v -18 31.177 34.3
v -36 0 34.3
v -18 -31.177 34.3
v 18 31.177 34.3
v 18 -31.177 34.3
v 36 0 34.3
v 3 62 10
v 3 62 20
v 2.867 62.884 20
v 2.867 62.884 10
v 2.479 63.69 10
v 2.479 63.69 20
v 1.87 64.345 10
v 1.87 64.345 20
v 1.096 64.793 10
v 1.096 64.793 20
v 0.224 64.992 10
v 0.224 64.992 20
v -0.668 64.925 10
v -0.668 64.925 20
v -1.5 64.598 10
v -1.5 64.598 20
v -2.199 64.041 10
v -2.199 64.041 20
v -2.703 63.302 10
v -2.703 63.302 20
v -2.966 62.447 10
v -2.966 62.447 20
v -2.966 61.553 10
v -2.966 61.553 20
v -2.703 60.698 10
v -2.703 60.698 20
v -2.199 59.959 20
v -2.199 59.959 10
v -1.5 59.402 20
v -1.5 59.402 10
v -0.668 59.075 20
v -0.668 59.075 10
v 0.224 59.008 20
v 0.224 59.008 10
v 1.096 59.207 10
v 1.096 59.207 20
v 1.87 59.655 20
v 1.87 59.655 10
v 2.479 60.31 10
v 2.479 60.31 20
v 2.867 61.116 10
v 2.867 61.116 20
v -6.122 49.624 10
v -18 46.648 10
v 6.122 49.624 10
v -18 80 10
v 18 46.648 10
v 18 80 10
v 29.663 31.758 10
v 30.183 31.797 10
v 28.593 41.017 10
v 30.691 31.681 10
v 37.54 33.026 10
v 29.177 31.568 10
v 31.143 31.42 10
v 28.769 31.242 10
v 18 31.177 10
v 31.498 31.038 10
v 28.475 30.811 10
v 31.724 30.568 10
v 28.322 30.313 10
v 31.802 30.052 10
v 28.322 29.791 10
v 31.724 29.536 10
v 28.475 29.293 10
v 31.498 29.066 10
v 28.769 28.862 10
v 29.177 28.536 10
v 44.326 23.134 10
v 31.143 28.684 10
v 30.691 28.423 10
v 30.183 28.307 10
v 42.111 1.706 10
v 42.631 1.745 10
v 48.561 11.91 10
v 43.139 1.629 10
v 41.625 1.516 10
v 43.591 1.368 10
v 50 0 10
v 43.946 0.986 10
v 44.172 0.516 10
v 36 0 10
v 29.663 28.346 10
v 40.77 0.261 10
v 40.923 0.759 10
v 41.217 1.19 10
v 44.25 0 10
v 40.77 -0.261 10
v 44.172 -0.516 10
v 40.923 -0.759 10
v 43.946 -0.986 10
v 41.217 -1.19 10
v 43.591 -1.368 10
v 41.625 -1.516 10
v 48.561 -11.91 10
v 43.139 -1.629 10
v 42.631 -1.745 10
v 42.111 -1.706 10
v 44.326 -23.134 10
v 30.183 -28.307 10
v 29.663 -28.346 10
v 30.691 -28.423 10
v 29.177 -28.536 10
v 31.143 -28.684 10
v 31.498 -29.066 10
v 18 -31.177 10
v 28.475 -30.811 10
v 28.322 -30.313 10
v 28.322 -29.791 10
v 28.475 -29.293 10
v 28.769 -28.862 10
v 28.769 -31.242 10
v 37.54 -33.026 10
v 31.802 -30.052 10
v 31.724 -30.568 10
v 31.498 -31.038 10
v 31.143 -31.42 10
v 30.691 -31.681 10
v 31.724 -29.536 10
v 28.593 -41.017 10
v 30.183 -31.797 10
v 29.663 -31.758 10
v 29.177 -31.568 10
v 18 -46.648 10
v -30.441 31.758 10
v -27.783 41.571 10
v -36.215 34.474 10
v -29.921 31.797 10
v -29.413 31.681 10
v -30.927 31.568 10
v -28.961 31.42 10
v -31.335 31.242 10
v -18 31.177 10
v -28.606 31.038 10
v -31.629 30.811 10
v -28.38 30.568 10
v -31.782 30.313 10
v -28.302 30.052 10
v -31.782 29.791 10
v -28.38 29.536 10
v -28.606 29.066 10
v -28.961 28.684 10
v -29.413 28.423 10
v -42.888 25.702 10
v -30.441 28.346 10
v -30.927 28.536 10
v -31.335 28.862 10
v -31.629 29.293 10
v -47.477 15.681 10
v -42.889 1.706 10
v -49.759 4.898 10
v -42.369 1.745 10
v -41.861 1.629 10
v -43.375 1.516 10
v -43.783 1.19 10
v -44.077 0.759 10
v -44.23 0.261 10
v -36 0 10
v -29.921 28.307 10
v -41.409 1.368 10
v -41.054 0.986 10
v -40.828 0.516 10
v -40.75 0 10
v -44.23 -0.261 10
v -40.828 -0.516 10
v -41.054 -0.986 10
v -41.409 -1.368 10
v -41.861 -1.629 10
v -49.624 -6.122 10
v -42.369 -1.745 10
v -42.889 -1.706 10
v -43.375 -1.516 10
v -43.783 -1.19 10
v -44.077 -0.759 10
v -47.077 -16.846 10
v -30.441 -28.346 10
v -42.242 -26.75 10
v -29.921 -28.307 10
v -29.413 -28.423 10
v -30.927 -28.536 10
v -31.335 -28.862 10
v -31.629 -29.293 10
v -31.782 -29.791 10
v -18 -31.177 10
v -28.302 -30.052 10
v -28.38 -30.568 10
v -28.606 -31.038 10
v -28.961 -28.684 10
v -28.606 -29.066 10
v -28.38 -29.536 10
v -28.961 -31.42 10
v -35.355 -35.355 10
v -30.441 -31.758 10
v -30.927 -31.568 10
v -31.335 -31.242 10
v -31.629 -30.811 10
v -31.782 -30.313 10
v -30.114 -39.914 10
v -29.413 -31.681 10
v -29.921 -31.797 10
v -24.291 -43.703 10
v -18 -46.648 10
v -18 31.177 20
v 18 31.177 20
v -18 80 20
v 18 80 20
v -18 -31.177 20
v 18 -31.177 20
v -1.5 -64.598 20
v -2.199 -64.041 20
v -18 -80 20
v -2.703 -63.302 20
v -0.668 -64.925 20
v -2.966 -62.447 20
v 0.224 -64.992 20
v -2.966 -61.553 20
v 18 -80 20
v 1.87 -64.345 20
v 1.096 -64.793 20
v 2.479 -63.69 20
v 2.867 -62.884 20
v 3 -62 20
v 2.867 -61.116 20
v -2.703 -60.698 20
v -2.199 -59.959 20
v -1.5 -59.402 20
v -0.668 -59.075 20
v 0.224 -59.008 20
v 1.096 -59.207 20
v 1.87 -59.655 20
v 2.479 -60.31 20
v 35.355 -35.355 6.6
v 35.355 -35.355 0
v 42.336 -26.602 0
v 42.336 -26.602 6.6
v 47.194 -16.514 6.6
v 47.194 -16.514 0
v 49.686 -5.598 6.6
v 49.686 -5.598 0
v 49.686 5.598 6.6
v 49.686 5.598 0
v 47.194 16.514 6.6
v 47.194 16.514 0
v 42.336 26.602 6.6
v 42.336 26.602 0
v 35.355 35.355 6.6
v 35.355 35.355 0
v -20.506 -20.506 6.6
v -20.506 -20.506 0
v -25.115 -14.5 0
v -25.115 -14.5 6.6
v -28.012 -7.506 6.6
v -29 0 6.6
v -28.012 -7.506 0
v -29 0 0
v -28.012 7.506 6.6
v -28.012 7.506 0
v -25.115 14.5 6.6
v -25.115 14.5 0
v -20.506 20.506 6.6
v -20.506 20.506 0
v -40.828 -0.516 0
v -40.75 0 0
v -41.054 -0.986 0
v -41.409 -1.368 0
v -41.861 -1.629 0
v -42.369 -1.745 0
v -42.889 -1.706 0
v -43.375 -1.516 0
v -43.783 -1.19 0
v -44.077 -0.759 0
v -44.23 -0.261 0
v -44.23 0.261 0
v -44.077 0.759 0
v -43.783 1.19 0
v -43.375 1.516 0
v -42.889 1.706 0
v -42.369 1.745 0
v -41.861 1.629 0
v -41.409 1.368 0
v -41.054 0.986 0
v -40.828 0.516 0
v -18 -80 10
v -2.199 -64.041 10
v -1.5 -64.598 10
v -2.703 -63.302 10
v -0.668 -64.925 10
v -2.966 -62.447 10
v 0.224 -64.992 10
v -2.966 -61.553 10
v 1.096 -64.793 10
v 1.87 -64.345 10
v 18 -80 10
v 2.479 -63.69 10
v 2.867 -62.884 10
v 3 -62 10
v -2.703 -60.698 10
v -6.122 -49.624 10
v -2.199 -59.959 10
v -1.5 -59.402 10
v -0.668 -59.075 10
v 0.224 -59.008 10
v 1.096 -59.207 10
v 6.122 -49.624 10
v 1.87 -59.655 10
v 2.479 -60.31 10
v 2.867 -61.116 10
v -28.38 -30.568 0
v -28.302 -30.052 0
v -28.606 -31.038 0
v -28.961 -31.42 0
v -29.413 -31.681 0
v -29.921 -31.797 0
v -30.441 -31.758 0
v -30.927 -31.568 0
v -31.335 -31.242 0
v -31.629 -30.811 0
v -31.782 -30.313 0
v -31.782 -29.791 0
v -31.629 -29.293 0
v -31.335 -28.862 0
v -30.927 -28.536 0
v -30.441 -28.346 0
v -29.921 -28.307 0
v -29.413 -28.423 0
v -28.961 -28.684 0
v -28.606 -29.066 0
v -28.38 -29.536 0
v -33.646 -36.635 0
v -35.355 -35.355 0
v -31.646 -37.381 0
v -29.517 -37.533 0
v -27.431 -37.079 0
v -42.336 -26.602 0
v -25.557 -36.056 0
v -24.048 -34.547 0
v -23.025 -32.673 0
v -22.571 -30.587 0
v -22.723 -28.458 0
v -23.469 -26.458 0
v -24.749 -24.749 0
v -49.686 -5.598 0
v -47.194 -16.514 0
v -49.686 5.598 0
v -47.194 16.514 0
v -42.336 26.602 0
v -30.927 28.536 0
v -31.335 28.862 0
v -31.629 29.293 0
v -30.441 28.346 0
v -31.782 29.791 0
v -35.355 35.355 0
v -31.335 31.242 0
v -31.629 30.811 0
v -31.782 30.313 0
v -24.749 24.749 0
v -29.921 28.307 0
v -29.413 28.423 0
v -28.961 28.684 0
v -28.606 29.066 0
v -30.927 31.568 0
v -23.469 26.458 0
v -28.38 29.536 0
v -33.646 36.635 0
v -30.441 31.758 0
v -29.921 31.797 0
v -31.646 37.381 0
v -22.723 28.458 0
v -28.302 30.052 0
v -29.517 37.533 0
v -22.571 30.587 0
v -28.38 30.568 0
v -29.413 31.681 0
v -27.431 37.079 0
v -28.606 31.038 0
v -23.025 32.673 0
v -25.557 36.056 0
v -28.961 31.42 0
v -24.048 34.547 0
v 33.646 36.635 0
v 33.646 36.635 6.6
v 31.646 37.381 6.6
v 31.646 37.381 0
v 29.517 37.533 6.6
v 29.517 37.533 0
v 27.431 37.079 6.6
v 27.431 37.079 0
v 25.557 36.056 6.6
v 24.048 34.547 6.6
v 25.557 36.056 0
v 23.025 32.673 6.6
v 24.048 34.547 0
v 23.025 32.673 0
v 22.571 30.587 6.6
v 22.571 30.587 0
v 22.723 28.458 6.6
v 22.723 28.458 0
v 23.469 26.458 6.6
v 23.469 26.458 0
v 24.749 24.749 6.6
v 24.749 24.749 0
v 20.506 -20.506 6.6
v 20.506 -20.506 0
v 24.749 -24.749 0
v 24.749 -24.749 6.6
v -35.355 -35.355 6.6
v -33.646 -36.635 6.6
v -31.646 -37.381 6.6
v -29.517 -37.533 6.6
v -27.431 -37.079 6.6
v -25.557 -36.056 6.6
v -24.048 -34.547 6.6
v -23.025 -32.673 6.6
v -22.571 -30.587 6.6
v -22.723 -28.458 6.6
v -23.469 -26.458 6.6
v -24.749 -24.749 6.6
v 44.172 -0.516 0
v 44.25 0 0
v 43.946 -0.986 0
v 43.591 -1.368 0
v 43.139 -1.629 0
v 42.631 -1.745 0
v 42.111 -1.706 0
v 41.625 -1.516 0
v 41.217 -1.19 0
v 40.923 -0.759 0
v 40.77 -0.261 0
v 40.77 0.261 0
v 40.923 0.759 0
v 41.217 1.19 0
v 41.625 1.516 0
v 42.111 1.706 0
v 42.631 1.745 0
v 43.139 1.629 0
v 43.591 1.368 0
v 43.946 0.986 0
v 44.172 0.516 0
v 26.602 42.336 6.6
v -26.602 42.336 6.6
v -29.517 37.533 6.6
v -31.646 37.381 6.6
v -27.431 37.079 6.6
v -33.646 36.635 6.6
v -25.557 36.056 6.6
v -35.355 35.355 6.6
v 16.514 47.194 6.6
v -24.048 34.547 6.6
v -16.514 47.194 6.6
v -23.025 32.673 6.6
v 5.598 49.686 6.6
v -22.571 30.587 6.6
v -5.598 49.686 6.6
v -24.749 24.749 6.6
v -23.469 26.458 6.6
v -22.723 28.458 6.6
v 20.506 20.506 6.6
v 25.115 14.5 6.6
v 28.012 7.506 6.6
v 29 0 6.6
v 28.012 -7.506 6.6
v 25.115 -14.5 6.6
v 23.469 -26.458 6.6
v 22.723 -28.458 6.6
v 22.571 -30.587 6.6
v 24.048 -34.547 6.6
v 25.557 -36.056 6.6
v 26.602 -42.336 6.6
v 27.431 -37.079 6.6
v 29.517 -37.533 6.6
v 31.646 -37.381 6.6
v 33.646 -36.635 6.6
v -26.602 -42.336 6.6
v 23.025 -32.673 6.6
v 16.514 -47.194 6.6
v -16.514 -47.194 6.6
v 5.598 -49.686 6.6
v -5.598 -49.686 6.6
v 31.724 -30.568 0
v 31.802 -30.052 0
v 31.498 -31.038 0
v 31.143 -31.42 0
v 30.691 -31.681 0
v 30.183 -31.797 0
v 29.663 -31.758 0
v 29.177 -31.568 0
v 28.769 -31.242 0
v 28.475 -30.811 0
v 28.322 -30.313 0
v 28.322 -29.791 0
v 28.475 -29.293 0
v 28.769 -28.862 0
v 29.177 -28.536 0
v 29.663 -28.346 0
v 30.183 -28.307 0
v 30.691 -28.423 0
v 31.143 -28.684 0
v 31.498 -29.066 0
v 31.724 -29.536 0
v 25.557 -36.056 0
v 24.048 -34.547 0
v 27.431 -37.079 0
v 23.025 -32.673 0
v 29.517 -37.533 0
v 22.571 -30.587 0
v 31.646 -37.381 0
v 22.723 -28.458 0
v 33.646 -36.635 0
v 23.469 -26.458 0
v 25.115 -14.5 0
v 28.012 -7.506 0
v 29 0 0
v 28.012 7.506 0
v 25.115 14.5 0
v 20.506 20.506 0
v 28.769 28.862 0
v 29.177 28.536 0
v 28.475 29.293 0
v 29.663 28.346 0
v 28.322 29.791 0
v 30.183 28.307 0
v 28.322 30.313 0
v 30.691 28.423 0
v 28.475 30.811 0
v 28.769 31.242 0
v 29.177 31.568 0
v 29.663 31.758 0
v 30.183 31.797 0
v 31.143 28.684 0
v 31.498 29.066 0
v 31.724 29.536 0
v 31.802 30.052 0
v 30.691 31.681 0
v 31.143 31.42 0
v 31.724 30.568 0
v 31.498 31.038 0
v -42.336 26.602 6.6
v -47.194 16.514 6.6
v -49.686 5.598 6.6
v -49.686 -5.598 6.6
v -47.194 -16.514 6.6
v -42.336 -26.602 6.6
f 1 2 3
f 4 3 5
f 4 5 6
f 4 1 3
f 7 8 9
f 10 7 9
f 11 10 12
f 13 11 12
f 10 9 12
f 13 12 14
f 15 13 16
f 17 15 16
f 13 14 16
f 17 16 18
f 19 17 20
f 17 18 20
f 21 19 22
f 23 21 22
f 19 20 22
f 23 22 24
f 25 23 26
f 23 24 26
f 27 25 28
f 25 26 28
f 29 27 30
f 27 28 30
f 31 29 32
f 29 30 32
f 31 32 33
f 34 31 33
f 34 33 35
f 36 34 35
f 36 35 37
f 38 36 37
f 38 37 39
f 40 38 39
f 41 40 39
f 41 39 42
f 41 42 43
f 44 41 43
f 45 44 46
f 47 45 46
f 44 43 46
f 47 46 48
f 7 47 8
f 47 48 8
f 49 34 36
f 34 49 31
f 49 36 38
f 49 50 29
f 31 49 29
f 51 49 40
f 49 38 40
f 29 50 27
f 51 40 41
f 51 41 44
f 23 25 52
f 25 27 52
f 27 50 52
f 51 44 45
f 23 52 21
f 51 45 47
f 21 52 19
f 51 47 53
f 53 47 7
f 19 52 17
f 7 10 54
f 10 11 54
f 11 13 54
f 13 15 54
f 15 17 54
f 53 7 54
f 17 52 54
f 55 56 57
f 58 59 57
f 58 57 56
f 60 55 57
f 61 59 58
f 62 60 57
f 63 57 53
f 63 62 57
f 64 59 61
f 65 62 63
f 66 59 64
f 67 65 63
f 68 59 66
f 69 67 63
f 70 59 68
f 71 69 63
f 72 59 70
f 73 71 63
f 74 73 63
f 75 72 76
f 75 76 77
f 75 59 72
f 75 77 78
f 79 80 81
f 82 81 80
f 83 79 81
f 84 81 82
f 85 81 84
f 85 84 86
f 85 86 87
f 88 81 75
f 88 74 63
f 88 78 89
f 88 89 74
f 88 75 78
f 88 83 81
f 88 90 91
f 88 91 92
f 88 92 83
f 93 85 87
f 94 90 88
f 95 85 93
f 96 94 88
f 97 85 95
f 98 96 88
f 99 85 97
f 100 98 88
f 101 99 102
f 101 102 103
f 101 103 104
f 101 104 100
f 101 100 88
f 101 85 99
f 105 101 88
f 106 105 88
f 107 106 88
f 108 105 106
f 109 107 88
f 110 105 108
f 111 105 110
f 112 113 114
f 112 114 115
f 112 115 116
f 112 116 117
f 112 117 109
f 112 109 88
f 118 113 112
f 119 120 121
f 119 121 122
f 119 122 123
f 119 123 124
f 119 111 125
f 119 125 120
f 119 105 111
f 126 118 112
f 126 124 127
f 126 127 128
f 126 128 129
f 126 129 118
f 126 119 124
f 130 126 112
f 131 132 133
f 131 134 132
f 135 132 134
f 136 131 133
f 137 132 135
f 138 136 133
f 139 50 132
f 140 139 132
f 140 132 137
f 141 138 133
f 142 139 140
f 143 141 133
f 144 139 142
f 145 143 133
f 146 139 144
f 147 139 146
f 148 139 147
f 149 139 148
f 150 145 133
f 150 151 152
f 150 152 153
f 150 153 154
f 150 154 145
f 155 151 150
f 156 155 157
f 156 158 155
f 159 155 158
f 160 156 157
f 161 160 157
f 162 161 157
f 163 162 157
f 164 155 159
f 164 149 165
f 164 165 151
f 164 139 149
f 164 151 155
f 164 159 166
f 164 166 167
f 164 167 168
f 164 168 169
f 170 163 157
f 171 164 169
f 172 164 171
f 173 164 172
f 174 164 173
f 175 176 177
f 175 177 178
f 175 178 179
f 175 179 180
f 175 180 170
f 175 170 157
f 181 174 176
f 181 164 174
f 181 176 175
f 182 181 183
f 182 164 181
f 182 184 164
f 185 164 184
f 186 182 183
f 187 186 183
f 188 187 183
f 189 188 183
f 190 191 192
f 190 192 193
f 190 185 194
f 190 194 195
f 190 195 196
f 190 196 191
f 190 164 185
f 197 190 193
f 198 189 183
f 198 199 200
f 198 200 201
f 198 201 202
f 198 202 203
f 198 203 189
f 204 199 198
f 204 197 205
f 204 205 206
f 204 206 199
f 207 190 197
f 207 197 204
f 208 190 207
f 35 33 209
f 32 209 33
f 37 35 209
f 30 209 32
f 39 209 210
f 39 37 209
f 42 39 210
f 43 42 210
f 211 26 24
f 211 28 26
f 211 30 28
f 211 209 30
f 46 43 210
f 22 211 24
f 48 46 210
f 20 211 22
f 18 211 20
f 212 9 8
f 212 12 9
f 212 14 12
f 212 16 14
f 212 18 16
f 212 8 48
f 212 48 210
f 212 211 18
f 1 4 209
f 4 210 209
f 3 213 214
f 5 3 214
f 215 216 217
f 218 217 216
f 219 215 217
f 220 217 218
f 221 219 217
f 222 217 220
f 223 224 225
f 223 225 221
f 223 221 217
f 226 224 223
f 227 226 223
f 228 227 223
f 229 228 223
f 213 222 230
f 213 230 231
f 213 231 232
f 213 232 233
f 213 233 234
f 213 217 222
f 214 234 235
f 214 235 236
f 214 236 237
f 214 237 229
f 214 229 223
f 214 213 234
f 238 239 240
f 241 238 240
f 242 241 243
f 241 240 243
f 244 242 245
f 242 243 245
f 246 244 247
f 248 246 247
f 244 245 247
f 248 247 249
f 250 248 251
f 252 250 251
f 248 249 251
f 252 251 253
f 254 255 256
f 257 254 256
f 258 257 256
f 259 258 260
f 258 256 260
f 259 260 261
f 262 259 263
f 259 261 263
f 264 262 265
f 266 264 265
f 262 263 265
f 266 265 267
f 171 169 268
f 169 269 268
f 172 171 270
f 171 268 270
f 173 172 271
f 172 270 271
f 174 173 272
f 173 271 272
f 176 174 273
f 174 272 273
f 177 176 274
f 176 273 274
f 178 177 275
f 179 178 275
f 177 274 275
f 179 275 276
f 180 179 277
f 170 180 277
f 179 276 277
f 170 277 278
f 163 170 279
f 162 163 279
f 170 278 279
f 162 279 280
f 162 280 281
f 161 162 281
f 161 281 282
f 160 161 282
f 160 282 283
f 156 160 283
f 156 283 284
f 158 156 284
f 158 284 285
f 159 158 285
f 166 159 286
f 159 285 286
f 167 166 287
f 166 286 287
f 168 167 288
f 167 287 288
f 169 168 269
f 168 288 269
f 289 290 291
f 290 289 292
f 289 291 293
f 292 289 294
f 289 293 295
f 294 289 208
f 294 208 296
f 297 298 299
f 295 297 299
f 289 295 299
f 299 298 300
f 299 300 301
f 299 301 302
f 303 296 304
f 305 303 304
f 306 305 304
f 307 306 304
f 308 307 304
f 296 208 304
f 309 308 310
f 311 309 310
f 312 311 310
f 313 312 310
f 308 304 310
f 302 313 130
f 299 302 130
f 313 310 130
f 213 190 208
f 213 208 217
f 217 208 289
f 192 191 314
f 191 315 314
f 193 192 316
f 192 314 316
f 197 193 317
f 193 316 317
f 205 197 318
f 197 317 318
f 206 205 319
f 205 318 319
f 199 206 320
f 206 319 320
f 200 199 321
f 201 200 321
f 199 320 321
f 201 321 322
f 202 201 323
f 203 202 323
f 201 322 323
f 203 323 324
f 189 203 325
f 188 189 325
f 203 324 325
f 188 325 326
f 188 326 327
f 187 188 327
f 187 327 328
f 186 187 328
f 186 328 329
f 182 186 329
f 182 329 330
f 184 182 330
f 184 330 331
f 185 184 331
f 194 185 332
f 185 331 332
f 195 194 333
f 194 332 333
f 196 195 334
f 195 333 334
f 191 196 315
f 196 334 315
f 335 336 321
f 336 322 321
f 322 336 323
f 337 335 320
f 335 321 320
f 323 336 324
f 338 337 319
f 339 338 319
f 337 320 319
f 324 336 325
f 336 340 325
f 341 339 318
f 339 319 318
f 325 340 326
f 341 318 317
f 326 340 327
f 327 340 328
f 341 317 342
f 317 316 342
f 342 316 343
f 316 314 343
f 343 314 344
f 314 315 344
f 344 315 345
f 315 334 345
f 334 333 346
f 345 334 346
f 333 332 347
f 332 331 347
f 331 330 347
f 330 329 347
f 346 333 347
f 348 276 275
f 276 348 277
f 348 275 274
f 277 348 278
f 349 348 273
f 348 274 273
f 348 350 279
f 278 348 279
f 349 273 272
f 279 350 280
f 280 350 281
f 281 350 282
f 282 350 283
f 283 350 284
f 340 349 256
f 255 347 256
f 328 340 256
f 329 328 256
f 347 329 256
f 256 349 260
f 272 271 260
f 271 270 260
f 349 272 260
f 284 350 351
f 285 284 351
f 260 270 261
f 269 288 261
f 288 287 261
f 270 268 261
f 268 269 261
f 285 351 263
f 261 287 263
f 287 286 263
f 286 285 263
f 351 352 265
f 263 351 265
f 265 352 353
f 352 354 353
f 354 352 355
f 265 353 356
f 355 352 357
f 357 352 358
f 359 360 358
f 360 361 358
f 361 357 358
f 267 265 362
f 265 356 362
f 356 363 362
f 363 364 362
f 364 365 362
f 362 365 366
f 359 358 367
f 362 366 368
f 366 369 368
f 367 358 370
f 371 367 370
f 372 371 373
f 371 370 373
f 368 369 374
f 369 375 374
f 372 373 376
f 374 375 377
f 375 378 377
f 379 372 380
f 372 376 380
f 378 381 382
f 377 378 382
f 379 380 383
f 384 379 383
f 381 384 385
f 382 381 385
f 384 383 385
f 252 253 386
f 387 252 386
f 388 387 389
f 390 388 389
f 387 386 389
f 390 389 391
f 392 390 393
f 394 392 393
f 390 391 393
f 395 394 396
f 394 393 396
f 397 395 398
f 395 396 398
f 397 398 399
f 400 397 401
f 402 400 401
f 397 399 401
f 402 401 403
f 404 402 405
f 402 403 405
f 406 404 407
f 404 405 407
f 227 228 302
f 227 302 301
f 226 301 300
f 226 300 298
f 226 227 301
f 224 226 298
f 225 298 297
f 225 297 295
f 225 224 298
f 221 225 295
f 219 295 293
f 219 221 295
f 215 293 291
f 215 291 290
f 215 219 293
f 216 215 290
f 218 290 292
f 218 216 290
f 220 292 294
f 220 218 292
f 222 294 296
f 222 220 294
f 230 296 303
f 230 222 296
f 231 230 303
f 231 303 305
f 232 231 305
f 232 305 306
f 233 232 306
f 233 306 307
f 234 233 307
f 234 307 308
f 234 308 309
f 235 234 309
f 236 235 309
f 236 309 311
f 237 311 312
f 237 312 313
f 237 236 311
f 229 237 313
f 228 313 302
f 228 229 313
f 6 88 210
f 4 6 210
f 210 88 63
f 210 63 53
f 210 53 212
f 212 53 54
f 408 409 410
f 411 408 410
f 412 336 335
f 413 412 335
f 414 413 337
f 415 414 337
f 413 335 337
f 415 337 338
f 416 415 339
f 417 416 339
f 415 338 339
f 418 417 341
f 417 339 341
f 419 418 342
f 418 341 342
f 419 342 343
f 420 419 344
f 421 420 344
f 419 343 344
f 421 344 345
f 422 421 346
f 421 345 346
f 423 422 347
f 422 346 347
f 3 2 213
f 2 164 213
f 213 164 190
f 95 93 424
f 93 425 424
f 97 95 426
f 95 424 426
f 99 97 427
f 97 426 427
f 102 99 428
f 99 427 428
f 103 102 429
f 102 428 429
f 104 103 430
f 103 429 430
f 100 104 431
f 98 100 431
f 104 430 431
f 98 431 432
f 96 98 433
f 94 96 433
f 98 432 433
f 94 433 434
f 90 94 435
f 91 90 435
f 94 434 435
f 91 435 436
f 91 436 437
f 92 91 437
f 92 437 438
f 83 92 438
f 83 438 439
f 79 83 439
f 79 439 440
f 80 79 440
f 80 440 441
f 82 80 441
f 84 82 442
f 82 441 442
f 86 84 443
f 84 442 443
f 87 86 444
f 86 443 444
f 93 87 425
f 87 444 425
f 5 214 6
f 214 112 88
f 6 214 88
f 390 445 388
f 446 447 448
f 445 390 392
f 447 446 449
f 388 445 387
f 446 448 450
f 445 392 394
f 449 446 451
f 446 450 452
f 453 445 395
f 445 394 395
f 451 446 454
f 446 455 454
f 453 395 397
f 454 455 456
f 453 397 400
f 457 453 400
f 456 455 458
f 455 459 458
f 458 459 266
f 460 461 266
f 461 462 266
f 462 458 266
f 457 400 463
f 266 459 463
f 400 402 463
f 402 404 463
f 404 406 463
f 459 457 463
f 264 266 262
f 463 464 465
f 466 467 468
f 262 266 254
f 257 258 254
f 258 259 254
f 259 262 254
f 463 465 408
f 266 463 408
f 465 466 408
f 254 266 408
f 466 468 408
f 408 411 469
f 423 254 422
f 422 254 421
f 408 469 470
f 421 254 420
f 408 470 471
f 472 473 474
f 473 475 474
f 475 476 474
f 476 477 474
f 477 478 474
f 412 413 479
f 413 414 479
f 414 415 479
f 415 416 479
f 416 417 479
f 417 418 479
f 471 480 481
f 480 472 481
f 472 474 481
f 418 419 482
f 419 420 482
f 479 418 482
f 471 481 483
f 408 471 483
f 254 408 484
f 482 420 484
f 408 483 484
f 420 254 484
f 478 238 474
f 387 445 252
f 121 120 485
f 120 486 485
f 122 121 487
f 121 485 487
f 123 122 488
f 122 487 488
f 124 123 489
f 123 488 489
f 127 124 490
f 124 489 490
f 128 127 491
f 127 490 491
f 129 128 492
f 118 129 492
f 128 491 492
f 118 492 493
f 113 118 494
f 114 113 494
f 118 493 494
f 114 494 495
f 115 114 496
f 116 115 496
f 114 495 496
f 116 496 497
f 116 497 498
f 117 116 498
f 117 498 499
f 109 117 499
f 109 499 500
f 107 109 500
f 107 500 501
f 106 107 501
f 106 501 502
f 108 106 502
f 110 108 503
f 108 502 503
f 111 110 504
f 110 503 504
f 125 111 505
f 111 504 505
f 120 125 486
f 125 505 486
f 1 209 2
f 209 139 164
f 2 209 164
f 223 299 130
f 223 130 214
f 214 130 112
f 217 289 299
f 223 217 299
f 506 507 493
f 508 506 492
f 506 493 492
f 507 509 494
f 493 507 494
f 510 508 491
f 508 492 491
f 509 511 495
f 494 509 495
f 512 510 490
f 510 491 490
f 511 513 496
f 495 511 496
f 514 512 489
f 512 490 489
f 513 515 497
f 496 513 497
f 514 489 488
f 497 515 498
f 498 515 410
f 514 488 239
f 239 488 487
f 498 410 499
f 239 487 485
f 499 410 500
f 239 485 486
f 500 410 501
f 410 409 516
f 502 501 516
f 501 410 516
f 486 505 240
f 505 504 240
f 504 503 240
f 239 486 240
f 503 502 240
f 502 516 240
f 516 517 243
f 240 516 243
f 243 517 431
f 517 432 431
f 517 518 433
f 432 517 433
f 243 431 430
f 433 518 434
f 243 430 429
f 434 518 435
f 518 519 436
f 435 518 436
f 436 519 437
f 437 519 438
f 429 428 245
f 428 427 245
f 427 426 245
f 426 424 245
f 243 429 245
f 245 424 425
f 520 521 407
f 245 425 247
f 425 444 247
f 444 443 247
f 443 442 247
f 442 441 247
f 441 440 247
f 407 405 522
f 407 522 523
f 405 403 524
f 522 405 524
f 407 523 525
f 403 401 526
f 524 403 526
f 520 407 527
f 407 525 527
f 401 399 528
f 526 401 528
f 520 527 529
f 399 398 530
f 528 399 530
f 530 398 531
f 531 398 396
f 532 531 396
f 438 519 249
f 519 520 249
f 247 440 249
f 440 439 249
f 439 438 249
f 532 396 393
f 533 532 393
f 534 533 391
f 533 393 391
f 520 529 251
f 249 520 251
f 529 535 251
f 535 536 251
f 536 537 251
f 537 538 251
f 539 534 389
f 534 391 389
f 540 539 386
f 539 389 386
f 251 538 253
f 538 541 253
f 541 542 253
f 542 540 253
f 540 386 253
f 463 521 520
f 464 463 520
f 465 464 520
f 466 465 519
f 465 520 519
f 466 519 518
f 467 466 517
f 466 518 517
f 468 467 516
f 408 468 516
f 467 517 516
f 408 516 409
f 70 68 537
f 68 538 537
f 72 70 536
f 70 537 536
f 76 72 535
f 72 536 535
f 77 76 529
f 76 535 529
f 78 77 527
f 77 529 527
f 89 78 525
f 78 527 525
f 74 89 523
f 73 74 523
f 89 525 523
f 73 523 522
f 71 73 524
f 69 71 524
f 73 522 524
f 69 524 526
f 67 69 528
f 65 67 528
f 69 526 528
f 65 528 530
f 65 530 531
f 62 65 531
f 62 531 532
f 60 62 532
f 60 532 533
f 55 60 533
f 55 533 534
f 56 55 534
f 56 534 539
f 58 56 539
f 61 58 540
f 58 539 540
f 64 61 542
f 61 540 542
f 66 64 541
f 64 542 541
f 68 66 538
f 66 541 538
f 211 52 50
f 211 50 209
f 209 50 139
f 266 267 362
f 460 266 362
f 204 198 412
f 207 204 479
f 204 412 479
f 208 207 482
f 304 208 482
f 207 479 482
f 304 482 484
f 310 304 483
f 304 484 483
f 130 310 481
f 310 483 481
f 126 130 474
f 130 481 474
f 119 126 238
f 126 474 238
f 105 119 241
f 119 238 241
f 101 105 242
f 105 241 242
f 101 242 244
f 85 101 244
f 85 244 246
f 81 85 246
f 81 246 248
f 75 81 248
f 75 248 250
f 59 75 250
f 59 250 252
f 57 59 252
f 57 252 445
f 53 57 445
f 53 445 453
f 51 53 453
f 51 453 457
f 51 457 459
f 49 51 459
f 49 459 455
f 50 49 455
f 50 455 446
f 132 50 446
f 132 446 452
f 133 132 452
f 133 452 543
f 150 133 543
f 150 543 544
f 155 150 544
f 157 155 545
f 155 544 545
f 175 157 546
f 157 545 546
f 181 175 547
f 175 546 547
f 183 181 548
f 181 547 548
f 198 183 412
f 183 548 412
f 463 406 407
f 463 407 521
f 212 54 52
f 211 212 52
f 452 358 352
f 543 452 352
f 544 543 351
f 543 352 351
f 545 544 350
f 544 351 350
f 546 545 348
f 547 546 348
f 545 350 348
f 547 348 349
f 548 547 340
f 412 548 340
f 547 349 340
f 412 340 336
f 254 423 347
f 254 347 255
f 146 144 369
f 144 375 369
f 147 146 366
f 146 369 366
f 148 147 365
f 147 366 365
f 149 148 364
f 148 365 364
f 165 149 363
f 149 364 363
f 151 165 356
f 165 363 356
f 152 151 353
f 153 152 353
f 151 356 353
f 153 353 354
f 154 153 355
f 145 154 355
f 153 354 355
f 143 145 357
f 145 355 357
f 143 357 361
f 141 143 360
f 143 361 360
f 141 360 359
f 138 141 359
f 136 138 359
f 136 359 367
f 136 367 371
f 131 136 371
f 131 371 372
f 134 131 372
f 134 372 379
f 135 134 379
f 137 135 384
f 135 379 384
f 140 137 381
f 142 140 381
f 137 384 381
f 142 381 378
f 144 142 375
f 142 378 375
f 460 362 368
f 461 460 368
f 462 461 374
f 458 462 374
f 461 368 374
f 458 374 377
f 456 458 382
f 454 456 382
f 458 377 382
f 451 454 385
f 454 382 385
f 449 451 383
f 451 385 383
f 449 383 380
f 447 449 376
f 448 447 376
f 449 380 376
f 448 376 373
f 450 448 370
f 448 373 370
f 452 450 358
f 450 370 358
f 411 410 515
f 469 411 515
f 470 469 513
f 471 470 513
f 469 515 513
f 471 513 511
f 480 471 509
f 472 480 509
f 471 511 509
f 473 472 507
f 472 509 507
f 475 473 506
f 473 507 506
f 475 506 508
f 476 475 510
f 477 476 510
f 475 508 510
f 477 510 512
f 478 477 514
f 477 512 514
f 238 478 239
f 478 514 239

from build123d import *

# Parameters (mm, degrees)
SKETCH_1_R          = 1.75
EXTRUDE_1_DEPTH     = 6.6
EXTRUDE_1_2_DEPTH   = 6.6
SKETCH_2_R          = 50
EXTRUDE_2_DEPTH     = 3.4
SKETCH_4_R          = 1.75
CUT_EXTRUDE_2_DEPTH = 10
EXTRUDE_7_DEPTH     = 20
SKETCH_10_W         = 36
SKETCH_10_H         = 48.823085464
CUT_EXTRUDE_3_DEPTH = 10
SKETCH_11_R         = 3
CUT_EXTRUDE_6_DEPTH = 10
EXTRUDE_8_DEPTH     = 4.3


with BuildPart() as part:
    # 草图1 → 凸台-拉伸1 (new body)
    with BuildSketch(Plane.XY):
        with BuildLine():
            ThreePointArc((20.506096654, 20.506096654), (29, 0), (20.506096654, -20.506096654))
            Line((20.506096654, -20.506096654), (24.748737342, -24.748737342))
            ThreePointArc((24.748737342, -24.748737342), (24.748737342, -35.355339059), (35.355339059, -35.355339059))
            ThreePointArc((35.355339059, -35.355339059), (50, 0), (35.355339059, 35.355339059))
            ThreePointArc((35.355339059, 35.355339059), (24.748737342, 35.355339059), (24.748737342, 24.748737342))
            Line((24.748737342, 24.748737342), (20.506096654, 20.506096654))
        make_face()
        with Locations((30.0520382, 30.0520382)):
            Circle(SKETCH_1_R, mode=Mode.SUBTRACT)
        with Locations((30.0520382, -30.0520382)):
            Circle(SKETCH_1_R, mode=Mode.SUBTRACT)
        with Locations((42.5, 0)):
            Circle(SKETCH_1_R, mode=Mode.SUBTRACT)
    extrude(amount=EXTRUDE_1_DEPTH)



with BuildPart() as body_2:
    # 草图1 → Extrude 1 2 (new body)
    with BuildSketch(Plane.XY):
        with BuildLine():
            ThreePointArc((-35.355339059, 35.355339059), (-50, 0), (-35.355339059, -35.355339059))
            ThreePointArc((-35.355339059, -35.355339059), (-24.748737342, -35.355339059), (-24.748737342, -24.748737342))
            Line((-24.748737342, -24.748737342), (-20.506096654, -20.506096654))
            ThreePointArc((-20.506096654, -20.506096654), (-29, 0), (-20.506096654, 20.506096654))
            Line((-20.506096654, 20.506096654), (-24.748737342, 24.748737342))
            ThreePointArc((-24.748737342, 24.748737342), (-24.748737342, 35.355339059), (-35.355339059, 35.355339059))
        make_face()
        with Locations((-30.0520382, 30.0520382)):
            Circle(SKETCH_1_R, mode=Mode.SUBTRACT)
        with Locations((-30.0520382, -30.0520382)):
            Circle(SKETCH_1_R, mode=Mode.SUBTRACT)
        with Locations((-42.5, 0)):
            Circle(SKETCH_1_R, mode=Mode.SUBTRACT)
    extrude(amount=EXTRUDE_1_2_DEPTH)


with BuildPart() as part_1:
    add(part.part)

    add(body_2.part)  # 凸台-拉伸2 merges body 2
    # 草图2 → 凸台-拉伸2 (add)
    with BuildSketch(Plane.XY.offset(6.6)):
        with Locations(Location((0, 0, 0), (0, 0, 225))):
            Circle(SKETCH_2_R)
    extrude(amount=EXTRUDE_2_DEPTH)

    # 草图4 → 切除-拉伸2 (cut, symmetric)
    with BuildSketch(Plane(origin=(0, 0, 6.6), x_dir=(-1, 0, 0), z_dir=(0, 0, -1))):
        with Locations(Location((-42.5, 0, 0), (0, 0, 180))):
            Circle(SKETCH_4_R)
        with Locations(Location((-30.0520382, 30.0520382, 0), (0, 0, 180))):
            Circle(SKETCH_4_R)
        with Locations(Location((-30.0520382, -30.0520382, 0), (0, 0, 180))):
            Circle(SKETCH_4_R)
        with Locations(Location((30.0520382, -30.0520382, 0), (0, 0, 180))):
            Circle(SKETCH_4_R)
        with Locations(Location((42.5, 0, 0), (0, 0, 180))):
            Circle(SKETCH_4_R)
        with Locations(Location((30.0520382, 30.0520382, 0), (0, 0, 180))):
            Circle(SKETCH_4_R)
    extrude(amount=CUT_EXTRUDE_2_DEPTH, both=True, mode=Mode.SUBTRACT)

    # 草图5 → 凸台-拉伸7 (add)
    with BuildSketch(Plane.XY.offset(10)):
        Polygon((-18, -31.176914536), (-18, -80), (18, -80), (18, -31.176914536), (36, 0), (18, 31.176914536), (18, 80), (-18, 80), (-18, 31.176914536), (-36, 0), align=None)
    extrude(amount=EXTRUDE_7_DEPTH)

    # 草图10 → 切除-拉伸3 (cut)
    with BuildSketch(Plane.XY.offset(30)):
        with Locations((0, -55.588457268)):
            Rectangle(SKETCH_10_W, SKETCH_10_H)
        with Locations((0, 55.588457268)):
            Rectangle(SKETCH_10_W, SKETCH_10_H)
    extrude(amount=-CUT_EXTRUDE_3_DEPTH, mode=Mode.SUBTRACT)

    # 草图11 → 切除-拉伸6 (cut)
    with BuildSketch(Plane.XY.offset(20)):
        with Locations((0, 62)):
            Circle(SKETCH_11_R)
    cut_extrude_6 = extrude(amount=-CUT_EXTRUDE_6_DEPTH, mode=Mode.SUBTRACT)

    # 镜向2: 切除-拉伸6 across plane
    add(cut_extrude_6.mirror(Plane.ZX), mode=Mode.SUBTRACT)

    # 草图12 → 凸台-拉伸8 (add)
    with BuildSketch(Plane.XY.offset(30)):
        Polygon((36, 0), (18, 31.176914536), (-18, 31.176914536), (-36, 0), (-18, -31.176914536), (18, -31.176914536), align=None)
    extrude(amount=EXTRUDE_8_DEPTH)


solid = part_1.part
